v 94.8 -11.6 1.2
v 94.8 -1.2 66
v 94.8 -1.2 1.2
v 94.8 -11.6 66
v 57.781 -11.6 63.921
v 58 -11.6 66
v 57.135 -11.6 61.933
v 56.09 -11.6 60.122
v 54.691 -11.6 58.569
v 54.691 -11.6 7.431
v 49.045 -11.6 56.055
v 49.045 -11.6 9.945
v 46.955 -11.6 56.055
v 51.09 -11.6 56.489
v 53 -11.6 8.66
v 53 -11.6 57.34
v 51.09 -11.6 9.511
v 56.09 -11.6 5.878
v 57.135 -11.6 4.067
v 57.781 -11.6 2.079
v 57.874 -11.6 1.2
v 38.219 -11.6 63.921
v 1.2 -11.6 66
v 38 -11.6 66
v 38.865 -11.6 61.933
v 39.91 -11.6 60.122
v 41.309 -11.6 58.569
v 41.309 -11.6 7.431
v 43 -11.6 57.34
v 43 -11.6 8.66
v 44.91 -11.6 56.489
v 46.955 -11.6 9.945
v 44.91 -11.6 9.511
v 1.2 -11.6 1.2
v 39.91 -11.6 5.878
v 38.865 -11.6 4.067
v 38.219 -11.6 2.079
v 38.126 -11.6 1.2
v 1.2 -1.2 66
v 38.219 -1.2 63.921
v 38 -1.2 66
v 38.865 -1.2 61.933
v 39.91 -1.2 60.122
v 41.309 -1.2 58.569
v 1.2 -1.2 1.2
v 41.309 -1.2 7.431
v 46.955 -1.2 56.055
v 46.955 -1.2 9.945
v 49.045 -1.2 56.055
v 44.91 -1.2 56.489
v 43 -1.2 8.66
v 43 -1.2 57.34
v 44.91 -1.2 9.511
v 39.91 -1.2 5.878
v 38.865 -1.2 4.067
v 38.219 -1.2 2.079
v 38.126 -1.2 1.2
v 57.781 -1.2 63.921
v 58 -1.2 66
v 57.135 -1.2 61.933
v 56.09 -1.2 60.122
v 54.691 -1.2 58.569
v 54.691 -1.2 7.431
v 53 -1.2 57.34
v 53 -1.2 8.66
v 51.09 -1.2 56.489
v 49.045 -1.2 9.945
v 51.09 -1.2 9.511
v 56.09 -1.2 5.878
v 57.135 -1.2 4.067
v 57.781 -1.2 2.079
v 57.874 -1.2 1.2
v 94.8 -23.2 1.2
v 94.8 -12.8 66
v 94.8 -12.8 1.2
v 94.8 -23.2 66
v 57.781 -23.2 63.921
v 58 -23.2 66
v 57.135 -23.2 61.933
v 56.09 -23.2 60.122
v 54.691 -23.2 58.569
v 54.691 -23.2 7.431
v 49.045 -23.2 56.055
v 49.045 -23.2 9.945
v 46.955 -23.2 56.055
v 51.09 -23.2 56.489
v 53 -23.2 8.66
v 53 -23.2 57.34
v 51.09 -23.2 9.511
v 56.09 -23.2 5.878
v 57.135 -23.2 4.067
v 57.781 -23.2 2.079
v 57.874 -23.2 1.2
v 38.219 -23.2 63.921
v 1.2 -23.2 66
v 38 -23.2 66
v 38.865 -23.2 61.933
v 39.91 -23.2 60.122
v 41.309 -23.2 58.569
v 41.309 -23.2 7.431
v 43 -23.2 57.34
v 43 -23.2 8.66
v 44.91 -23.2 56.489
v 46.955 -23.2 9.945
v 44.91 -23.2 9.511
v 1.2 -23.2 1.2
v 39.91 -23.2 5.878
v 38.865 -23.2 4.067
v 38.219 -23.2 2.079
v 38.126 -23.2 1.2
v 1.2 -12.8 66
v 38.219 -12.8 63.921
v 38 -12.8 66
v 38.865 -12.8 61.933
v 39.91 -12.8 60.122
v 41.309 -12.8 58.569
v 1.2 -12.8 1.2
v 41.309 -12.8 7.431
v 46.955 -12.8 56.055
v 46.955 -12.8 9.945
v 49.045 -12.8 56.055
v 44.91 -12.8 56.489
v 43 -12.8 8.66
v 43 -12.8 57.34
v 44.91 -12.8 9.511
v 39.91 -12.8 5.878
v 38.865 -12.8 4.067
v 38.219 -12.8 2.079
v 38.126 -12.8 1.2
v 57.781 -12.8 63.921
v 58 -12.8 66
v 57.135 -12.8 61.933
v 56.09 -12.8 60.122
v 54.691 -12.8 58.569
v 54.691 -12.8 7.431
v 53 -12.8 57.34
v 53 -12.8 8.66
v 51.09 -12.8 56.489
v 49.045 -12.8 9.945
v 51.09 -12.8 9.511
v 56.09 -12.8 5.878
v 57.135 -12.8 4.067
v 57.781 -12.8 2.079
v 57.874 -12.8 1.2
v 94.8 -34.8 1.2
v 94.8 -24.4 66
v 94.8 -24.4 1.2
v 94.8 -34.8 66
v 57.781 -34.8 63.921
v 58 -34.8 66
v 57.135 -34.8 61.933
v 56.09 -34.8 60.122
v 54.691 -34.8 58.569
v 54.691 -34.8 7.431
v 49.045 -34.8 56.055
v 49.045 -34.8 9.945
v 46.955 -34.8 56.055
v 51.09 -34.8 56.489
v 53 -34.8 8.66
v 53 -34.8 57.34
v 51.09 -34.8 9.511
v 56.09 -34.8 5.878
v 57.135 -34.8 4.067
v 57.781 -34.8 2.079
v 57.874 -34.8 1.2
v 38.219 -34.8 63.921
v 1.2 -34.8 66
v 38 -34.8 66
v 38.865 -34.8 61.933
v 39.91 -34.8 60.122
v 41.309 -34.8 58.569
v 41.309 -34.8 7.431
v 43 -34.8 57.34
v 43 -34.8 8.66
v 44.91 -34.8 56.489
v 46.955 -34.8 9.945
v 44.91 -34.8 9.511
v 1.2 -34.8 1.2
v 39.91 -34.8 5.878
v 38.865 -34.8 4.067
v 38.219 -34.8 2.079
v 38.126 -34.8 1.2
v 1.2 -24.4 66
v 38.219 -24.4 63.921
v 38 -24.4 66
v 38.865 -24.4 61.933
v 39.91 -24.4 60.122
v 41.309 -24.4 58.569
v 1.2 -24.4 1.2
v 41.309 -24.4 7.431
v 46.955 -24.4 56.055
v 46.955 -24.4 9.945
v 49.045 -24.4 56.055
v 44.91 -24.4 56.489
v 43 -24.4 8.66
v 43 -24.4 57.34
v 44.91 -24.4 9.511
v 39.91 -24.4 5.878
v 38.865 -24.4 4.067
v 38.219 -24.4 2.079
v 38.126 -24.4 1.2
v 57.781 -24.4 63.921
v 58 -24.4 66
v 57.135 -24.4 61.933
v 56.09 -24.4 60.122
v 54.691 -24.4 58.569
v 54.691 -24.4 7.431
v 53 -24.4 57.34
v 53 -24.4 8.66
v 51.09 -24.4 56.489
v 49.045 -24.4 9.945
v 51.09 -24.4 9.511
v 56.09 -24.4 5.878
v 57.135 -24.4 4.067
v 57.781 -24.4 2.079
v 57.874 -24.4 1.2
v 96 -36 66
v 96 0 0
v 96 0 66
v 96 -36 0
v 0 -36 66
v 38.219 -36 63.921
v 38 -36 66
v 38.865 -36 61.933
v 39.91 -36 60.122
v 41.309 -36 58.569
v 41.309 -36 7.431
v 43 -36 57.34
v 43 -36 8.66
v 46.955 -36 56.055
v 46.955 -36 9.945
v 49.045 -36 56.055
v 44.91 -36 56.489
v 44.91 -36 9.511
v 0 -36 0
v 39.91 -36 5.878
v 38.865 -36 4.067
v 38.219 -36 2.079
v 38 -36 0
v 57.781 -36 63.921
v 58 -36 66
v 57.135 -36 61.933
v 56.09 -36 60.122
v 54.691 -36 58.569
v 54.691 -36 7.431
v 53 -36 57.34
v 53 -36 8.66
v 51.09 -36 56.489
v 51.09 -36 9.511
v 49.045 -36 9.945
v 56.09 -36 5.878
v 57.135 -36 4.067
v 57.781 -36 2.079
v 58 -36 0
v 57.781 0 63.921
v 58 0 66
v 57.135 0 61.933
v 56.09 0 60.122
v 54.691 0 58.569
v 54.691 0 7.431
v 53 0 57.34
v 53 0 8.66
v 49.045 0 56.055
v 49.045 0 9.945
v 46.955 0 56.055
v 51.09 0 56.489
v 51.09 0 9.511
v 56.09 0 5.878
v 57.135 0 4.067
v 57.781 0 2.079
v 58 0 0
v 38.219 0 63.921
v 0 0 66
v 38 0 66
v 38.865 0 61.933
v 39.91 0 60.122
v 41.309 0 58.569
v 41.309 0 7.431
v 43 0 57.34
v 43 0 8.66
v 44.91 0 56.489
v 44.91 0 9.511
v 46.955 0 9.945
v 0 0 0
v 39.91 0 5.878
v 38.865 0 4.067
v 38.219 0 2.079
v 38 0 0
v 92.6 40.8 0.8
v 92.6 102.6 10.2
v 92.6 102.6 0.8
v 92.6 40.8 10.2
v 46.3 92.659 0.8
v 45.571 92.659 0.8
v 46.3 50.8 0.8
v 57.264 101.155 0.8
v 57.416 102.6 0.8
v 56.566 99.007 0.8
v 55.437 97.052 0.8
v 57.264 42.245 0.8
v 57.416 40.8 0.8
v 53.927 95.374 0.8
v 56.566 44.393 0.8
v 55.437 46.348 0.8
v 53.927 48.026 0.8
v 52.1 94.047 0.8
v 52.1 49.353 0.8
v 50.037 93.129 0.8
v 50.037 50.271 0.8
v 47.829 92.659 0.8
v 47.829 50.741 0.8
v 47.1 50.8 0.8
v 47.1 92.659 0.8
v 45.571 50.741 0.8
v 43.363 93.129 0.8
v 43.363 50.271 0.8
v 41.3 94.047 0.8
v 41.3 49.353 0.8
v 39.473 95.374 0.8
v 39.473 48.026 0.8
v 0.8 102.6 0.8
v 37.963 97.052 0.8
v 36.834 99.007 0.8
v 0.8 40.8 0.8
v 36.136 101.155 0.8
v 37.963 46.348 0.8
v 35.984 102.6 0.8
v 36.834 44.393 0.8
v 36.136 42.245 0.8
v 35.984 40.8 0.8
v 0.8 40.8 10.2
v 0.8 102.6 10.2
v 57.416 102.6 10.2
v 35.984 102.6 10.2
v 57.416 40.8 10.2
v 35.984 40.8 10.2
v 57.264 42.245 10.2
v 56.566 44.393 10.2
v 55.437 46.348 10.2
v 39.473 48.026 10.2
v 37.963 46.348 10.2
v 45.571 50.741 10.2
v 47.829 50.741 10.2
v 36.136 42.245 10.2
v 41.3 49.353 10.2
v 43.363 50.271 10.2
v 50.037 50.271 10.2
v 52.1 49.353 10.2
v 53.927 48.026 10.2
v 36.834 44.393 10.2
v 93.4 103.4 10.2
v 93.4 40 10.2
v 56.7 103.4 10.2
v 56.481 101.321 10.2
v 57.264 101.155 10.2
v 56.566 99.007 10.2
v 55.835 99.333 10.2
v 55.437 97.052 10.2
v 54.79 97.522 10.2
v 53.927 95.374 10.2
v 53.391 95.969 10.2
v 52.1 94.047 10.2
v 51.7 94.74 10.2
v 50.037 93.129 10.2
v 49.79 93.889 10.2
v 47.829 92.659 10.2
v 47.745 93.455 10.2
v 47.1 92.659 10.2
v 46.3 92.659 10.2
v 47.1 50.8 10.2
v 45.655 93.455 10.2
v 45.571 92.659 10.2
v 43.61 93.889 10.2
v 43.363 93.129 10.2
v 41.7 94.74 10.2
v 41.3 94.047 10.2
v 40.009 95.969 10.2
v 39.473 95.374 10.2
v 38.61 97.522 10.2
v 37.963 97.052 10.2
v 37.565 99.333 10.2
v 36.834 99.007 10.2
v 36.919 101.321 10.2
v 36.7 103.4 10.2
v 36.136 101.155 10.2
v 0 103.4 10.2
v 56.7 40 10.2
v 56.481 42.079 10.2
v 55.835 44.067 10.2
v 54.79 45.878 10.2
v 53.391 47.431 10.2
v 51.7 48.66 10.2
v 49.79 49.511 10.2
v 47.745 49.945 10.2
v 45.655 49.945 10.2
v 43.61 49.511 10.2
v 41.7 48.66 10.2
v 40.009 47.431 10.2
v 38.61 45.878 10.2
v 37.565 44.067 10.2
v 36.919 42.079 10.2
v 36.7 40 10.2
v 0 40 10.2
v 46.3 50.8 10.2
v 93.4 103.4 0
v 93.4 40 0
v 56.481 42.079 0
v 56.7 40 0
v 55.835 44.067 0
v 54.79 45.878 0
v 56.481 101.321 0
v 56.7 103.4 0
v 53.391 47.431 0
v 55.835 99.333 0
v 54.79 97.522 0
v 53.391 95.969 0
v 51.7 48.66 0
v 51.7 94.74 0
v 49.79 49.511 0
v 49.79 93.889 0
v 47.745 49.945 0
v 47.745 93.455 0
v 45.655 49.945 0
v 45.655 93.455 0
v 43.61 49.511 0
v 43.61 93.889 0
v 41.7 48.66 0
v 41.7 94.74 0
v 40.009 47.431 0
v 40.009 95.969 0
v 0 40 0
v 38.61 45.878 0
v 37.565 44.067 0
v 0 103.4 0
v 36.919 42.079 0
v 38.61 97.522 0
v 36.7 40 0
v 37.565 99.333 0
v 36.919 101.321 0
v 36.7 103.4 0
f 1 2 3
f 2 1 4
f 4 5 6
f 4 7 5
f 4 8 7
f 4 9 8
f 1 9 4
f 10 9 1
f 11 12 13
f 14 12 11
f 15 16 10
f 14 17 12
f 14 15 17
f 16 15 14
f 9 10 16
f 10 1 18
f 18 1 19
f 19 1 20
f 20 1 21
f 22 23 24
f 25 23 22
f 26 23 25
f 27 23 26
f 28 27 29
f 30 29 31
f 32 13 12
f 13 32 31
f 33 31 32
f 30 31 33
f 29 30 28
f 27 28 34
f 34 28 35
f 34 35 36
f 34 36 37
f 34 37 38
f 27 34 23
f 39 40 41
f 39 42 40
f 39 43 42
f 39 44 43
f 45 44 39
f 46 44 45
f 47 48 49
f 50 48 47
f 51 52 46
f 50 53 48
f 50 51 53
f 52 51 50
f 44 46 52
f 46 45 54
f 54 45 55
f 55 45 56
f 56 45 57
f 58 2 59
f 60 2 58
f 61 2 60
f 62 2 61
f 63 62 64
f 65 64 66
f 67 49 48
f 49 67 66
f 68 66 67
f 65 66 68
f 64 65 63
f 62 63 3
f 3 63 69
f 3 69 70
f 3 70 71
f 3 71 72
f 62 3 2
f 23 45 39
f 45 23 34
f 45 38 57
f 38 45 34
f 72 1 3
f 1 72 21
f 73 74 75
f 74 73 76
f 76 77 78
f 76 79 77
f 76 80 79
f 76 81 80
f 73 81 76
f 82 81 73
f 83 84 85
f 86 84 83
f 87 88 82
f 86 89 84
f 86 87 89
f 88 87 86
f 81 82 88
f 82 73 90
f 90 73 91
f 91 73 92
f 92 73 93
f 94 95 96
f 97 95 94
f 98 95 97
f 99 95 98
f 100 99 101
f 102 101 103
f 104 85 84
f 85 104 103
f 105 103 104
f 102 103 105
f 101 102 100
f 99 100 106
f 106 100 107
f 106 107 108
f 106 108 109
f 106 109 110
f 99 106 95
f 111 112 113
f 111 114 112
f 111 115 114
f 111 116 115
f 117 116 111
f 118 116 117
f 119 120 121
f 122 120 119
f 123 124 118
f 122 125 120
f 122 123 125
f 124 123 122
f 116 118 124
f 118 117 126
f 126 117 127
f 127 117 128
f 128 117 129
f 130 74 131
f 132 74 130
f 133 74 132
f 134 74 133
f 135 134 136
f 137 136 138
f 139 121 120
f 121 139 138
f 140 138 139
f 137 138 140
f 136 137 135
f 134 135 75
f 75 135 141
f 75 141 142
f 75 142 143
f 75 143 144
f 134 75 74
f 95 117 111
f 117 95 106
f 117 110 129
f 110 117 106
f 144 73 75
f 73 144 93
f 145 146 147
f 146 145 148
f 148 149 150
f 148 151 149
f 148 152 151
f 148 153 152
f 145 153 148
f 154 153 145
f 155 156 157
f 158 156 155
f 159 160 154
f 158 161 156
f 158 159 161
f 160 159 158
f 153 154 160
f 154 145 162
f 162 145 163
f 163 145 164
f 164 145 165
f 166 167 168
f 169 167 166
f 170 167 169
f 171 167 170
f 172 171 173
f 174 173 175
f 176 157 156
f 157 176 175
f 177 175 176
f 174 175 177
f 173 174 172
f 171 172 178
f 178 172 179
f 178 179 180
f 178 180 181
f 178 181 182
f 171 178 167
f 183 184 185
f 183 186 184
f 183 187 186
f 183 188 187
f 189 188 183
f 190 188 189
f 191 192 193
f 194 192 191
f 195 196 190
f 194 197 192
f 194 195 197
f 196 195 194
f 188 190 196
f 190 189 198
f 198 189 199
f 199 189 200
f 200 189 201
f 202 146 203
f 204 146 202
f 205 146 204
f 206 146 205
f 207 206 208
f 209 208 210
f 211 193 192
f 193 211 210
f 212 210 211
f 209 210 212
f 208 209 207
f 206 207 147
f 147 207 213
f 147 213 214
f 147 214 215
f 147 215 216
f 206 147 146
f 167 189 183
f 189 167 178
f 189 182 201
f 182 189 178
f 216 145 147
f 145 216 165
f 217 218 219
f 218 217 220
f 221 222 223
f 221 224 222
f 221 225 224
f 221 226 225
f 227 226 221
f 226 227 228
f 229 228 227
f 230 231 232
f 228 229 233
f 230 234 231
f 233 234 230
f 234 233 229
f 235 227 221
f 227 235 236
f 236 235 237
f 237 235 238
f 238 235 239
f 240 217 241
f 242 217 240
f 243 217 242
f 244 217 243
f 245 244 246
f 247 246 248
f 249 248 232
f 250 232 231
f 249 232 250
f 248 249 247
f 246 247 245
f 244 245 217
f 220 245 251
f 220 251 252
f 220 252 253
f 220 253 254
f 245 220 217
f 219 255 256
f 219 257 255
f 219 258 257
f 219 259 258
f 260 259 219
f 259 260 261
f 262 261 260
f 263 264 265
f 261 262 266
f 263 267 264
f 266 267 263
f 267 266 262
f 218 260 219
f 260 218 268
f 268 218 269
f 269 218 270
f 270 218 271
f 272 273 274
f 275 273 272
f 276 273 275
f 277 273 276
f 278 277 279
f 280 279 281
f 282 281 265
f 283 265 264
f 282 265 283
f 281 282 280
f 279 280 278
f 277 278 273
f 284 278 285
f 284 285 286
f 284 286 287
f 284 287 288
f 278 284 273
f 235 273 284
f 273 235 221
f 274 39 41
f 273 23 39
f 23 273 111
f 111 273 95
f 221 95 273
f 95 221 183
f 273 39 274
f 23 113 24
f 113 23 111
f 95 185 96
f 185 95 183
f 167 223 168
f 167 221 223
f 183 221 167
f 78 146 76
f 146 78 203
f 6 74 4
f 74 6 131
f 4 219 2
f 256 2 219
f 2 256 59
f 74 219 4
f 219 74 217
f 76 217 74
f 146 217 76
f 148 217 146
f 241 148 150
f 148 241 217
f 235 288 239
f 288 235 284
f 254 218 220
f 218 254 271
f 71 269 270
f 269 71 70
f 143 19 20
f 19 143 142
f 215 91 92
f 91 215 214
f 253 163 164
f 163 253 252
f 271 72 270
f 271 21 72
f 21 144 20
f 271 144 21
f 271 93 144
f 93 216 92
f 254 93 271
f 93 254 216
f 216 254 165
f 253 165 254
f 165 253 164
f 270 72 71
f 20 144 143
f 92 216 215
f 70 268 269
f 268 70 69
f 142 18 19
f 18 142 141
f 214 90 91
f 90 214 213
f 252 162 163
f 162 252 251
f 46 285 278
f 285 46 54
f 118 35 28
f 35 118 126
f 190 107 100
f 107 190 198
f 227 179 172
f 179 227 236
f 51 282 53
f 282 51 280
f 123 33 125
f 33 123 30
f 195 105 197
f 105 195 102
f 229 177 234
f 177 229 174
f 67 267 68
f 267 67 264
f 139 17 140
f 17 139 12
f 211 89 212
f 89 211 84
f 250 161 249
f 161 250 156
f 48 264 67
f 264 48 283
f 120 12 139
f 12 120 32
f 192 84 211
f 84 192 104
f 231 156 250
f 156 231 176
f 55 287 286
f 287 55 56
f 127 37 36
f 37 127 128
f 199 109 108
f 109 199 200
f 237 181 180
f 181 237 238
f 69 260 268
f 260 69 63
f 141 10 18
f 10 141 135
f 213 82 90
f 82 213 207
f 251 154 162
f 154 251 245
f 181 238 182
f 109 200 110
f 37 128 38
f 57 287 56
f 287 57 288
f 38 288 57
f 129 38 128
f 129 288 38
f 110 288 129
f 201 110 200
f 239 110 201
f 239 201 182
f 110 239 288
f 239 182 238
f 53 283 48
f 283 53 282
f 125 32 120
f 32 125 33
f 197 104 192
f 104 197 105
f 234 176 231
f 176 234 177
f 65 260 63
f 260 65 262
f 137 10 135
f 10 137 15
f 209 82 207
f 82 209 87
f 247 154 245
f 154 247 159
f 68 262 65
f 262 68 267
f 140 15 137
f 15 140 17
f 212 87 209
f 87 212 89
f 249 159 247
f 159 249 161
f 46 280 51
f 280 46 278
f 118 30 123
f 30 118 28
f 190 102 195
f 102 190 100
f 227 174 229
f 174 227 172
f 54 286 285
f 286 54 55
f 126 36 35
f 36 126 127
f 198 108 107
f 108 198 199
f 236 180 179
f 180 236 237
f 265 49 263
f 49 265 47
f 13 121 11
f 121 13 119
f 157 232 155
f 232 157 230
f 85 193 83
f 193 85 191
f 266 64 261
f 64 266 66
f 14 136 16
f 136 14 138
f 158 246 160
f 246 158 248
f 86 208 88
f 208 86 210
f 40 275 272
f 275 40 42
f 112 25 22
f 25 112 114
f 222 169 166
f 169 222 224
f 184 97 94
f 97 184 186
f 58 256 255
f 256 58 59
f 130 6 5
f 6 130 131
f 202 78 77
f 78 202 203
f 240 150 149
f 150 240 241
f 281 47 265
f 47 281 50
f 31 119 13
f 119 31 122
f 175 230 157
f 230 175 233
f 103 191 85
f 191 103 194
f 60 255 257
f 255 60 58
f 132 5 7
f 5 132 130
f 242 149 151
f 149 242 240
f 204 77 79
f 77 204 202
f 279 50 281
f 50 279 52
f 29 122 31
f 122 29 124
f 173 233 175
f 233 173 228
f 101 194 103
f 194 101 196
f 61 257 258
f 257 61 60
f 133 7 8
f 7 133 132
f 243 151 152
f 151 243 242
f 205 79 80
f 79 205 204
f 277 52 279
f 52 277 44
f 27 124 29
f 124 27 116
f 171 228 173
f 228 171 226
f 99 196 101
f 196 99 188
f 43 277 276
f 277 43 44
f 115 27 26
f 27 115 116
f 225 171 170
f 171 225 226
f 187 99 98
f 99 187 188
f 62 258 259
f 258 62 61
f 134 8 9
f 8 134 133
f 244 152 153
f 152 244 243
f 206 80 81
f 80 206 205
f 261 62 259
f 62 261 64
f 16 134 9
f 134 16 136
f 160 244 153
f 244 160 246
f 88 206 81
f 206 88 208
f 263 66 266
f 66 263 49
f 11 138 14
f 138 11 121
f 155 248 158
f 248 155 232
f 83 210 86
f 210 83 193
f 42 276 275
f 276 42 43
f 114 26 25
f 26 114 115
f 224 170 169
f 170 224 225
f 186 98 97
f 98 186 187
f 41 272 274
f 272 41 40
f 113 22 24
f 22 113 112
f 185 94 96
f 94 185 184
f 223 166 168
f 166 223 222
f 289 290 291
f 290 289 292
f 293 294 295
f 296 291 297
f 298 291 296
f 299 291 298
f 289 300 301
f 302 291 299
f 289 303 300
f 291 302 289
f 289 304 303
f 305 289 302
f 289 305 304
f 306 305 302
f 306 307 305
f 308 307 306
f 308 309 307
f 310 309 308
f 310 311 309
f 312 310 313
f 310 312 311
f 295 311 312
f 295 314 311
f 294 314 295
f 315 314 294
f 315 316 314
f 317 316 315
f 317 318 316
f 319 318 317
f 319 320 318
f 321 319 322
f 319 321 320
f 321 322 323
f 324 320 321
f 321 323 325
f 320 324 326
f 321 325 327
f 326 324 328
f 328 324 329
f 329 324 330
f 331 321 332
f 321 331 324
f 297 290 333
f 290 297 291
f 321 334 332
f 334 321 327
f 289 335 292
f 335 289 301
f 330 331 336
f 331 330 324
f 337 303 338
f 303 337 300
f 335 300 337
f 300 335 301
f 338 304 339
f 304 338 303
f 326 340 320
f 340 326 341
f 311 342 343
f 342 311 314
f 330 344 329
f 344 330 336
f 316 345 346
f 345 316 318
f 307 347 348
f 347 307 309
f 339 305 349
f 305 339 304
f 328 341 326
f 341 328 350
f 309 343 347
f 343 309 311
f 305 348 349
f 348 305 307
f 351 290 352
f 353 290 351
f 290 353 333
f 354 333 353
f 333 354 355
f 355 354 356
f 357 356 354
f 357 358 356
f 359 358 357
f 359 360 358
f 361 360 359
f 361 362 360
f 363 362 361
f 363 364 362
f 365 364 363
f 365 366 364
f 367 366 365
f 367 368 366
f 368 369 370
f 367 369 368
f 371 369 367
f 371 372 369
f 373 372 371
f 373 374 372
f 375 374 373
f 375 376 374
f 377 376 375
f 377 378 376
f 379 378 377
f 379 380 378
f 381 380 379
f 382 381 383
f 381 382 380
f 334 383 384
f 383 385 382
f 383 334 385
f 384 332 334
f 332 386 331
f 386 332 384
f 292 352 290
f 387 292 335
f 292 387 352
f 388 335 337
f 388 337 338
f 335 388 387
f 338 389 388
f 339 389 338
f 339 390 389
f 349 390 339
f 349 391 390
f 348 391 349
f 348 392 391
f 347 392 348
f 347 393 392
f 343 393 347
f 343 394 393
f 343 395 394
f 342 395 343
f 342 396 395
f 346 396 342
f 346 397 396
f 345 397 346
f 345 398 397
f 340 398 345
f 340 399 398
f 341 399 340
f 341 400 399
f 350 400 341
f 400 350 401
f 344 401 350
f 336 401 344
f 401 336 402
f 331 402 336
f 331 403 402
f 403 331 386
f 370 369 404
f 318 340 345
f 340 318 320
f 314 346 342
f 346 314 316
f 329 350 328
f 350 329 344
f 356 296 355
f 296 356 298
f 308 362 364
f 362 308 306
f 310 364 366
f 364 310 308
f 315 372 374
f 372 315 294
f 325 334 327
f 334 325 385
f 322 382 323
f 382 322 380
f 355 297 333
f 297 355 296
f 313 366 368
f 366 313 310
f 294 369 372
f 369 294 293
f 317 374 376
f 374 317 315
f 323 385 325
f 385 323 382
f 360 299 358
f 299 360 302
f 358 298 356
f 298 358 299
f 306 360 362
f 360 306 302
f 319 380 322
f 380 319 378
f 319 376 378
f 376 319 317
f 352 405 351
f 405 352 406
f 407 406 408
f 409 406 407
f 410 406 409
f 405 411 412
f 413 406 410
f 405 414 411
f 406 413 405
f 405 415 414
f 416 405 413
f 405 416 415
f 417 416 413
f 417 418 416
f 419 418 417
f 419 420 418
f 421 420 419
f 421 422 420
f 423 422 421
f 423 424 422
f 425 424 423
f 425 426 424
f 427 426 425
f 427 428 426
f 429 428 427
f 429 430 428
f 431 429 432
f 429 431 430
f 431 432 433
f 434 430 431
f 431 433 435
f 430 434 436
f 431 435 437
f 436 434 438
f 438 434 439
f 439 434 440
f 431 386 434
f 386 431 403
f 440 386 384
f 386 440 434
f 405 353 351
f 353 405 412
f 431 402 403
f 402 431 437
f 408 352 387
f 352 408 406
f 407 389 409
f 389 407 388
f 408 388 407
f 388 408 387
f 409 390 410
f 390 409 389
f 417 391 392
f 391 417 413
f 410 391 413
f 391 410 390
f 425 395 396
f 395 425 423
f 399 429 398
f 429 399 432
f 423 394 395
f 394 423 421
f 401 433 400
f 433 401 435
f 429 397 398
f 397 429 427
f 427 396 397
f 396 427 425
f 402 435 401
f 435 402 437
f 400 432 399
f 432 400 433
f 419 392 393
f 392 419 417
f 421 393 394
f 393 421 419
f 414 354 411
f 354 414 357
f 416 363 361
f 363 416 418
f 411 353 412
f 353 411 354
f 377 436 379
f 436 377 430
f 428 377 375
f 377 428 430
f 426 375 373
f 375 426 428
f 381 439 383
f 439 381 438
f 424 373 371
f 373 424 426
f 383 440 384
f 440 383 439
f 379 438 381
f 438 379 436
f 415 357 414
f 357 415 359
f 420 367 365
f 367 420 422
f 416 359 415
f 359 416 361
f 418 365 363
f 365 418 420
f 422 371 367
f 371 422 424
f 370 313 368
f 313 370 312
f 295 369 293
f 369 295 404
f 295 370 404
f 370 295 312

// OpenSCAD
// Jisogi

module drawers(size,count = 3) {
    width = size.x;
    depth = size.y;
    height = size.z;
    thick = 1.2;
    dh = (height - thick * (count + 1)) / count;
    echo(dh);
    difference() {
        cube([width,depth,height]);
        for (i=[0:count-1])
            translate([thick,thick,thick + (dh + thick) * i]) 
                cube([width-thick*2,depth,dh]);
        translate([width/2,0,0]) cylinder(d=20,h=99);
        translate([width/2,depth,0]) cylinder(d=20,h=99);

    }
}

module drawer1(size,height = 10.2) {
    width = size.x;
    depth = size.y;
    difference() {
        cube([width-2.6,depth-2.6,height]);
        difference() {
            translate([0.8,0.8,0.8]) cube([width-2.6-1.6,depth-2.6-1.6,height]);
            translate([(width-2.6)/2,0,0]) cylinder(d=21.6,h=height);
            translate([(width-2.6)/2,depth-2.6,0]) cylinder(d=21.6,h=height);
        }
        translate([(width-2.6)/2,0,0]) cylinder(d=20,h=height);
        translate([(width-2.6)/2,depth-2.6,0]) cylinder(d=20,h=height);
    }
    
        translate([(width-2.6)/2-0.4,21.6/2,0])
            cube([0.8,depth-21.6-2,height]);
}

//d1 = [90,70,36];
d1 = [96,66,36];

rotate([90,0,0]) drawers(d1,3);

translate([0,40,0]) drawer1(d1);
